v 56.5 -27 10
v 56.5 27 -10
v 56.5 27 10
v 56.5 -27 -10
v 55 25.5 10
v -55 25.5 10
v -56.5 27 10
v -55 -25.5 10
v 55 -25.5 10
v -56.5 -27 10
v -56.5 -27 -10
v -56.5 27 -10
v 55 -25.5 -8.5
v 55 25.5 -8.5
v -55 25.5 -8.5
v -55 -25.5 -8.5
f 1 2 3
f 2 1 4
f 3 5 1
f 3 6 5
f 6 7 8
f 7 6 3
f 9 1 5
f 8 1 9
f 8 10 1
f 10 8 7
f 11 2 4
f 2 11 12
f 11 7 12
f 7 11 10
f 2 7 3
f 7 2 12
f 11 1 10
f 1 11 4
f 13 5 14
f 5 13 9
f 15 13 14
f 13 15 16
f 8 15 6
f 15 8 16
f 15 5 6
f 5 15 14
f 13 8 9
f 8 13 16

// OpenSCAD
module example003()
{
	difference() {
		
       cube([113, 54, 20], center = true);

       translate([0,0,1])
	    cube([110, 51, 19], center = true);
		
	}
}

example003();
